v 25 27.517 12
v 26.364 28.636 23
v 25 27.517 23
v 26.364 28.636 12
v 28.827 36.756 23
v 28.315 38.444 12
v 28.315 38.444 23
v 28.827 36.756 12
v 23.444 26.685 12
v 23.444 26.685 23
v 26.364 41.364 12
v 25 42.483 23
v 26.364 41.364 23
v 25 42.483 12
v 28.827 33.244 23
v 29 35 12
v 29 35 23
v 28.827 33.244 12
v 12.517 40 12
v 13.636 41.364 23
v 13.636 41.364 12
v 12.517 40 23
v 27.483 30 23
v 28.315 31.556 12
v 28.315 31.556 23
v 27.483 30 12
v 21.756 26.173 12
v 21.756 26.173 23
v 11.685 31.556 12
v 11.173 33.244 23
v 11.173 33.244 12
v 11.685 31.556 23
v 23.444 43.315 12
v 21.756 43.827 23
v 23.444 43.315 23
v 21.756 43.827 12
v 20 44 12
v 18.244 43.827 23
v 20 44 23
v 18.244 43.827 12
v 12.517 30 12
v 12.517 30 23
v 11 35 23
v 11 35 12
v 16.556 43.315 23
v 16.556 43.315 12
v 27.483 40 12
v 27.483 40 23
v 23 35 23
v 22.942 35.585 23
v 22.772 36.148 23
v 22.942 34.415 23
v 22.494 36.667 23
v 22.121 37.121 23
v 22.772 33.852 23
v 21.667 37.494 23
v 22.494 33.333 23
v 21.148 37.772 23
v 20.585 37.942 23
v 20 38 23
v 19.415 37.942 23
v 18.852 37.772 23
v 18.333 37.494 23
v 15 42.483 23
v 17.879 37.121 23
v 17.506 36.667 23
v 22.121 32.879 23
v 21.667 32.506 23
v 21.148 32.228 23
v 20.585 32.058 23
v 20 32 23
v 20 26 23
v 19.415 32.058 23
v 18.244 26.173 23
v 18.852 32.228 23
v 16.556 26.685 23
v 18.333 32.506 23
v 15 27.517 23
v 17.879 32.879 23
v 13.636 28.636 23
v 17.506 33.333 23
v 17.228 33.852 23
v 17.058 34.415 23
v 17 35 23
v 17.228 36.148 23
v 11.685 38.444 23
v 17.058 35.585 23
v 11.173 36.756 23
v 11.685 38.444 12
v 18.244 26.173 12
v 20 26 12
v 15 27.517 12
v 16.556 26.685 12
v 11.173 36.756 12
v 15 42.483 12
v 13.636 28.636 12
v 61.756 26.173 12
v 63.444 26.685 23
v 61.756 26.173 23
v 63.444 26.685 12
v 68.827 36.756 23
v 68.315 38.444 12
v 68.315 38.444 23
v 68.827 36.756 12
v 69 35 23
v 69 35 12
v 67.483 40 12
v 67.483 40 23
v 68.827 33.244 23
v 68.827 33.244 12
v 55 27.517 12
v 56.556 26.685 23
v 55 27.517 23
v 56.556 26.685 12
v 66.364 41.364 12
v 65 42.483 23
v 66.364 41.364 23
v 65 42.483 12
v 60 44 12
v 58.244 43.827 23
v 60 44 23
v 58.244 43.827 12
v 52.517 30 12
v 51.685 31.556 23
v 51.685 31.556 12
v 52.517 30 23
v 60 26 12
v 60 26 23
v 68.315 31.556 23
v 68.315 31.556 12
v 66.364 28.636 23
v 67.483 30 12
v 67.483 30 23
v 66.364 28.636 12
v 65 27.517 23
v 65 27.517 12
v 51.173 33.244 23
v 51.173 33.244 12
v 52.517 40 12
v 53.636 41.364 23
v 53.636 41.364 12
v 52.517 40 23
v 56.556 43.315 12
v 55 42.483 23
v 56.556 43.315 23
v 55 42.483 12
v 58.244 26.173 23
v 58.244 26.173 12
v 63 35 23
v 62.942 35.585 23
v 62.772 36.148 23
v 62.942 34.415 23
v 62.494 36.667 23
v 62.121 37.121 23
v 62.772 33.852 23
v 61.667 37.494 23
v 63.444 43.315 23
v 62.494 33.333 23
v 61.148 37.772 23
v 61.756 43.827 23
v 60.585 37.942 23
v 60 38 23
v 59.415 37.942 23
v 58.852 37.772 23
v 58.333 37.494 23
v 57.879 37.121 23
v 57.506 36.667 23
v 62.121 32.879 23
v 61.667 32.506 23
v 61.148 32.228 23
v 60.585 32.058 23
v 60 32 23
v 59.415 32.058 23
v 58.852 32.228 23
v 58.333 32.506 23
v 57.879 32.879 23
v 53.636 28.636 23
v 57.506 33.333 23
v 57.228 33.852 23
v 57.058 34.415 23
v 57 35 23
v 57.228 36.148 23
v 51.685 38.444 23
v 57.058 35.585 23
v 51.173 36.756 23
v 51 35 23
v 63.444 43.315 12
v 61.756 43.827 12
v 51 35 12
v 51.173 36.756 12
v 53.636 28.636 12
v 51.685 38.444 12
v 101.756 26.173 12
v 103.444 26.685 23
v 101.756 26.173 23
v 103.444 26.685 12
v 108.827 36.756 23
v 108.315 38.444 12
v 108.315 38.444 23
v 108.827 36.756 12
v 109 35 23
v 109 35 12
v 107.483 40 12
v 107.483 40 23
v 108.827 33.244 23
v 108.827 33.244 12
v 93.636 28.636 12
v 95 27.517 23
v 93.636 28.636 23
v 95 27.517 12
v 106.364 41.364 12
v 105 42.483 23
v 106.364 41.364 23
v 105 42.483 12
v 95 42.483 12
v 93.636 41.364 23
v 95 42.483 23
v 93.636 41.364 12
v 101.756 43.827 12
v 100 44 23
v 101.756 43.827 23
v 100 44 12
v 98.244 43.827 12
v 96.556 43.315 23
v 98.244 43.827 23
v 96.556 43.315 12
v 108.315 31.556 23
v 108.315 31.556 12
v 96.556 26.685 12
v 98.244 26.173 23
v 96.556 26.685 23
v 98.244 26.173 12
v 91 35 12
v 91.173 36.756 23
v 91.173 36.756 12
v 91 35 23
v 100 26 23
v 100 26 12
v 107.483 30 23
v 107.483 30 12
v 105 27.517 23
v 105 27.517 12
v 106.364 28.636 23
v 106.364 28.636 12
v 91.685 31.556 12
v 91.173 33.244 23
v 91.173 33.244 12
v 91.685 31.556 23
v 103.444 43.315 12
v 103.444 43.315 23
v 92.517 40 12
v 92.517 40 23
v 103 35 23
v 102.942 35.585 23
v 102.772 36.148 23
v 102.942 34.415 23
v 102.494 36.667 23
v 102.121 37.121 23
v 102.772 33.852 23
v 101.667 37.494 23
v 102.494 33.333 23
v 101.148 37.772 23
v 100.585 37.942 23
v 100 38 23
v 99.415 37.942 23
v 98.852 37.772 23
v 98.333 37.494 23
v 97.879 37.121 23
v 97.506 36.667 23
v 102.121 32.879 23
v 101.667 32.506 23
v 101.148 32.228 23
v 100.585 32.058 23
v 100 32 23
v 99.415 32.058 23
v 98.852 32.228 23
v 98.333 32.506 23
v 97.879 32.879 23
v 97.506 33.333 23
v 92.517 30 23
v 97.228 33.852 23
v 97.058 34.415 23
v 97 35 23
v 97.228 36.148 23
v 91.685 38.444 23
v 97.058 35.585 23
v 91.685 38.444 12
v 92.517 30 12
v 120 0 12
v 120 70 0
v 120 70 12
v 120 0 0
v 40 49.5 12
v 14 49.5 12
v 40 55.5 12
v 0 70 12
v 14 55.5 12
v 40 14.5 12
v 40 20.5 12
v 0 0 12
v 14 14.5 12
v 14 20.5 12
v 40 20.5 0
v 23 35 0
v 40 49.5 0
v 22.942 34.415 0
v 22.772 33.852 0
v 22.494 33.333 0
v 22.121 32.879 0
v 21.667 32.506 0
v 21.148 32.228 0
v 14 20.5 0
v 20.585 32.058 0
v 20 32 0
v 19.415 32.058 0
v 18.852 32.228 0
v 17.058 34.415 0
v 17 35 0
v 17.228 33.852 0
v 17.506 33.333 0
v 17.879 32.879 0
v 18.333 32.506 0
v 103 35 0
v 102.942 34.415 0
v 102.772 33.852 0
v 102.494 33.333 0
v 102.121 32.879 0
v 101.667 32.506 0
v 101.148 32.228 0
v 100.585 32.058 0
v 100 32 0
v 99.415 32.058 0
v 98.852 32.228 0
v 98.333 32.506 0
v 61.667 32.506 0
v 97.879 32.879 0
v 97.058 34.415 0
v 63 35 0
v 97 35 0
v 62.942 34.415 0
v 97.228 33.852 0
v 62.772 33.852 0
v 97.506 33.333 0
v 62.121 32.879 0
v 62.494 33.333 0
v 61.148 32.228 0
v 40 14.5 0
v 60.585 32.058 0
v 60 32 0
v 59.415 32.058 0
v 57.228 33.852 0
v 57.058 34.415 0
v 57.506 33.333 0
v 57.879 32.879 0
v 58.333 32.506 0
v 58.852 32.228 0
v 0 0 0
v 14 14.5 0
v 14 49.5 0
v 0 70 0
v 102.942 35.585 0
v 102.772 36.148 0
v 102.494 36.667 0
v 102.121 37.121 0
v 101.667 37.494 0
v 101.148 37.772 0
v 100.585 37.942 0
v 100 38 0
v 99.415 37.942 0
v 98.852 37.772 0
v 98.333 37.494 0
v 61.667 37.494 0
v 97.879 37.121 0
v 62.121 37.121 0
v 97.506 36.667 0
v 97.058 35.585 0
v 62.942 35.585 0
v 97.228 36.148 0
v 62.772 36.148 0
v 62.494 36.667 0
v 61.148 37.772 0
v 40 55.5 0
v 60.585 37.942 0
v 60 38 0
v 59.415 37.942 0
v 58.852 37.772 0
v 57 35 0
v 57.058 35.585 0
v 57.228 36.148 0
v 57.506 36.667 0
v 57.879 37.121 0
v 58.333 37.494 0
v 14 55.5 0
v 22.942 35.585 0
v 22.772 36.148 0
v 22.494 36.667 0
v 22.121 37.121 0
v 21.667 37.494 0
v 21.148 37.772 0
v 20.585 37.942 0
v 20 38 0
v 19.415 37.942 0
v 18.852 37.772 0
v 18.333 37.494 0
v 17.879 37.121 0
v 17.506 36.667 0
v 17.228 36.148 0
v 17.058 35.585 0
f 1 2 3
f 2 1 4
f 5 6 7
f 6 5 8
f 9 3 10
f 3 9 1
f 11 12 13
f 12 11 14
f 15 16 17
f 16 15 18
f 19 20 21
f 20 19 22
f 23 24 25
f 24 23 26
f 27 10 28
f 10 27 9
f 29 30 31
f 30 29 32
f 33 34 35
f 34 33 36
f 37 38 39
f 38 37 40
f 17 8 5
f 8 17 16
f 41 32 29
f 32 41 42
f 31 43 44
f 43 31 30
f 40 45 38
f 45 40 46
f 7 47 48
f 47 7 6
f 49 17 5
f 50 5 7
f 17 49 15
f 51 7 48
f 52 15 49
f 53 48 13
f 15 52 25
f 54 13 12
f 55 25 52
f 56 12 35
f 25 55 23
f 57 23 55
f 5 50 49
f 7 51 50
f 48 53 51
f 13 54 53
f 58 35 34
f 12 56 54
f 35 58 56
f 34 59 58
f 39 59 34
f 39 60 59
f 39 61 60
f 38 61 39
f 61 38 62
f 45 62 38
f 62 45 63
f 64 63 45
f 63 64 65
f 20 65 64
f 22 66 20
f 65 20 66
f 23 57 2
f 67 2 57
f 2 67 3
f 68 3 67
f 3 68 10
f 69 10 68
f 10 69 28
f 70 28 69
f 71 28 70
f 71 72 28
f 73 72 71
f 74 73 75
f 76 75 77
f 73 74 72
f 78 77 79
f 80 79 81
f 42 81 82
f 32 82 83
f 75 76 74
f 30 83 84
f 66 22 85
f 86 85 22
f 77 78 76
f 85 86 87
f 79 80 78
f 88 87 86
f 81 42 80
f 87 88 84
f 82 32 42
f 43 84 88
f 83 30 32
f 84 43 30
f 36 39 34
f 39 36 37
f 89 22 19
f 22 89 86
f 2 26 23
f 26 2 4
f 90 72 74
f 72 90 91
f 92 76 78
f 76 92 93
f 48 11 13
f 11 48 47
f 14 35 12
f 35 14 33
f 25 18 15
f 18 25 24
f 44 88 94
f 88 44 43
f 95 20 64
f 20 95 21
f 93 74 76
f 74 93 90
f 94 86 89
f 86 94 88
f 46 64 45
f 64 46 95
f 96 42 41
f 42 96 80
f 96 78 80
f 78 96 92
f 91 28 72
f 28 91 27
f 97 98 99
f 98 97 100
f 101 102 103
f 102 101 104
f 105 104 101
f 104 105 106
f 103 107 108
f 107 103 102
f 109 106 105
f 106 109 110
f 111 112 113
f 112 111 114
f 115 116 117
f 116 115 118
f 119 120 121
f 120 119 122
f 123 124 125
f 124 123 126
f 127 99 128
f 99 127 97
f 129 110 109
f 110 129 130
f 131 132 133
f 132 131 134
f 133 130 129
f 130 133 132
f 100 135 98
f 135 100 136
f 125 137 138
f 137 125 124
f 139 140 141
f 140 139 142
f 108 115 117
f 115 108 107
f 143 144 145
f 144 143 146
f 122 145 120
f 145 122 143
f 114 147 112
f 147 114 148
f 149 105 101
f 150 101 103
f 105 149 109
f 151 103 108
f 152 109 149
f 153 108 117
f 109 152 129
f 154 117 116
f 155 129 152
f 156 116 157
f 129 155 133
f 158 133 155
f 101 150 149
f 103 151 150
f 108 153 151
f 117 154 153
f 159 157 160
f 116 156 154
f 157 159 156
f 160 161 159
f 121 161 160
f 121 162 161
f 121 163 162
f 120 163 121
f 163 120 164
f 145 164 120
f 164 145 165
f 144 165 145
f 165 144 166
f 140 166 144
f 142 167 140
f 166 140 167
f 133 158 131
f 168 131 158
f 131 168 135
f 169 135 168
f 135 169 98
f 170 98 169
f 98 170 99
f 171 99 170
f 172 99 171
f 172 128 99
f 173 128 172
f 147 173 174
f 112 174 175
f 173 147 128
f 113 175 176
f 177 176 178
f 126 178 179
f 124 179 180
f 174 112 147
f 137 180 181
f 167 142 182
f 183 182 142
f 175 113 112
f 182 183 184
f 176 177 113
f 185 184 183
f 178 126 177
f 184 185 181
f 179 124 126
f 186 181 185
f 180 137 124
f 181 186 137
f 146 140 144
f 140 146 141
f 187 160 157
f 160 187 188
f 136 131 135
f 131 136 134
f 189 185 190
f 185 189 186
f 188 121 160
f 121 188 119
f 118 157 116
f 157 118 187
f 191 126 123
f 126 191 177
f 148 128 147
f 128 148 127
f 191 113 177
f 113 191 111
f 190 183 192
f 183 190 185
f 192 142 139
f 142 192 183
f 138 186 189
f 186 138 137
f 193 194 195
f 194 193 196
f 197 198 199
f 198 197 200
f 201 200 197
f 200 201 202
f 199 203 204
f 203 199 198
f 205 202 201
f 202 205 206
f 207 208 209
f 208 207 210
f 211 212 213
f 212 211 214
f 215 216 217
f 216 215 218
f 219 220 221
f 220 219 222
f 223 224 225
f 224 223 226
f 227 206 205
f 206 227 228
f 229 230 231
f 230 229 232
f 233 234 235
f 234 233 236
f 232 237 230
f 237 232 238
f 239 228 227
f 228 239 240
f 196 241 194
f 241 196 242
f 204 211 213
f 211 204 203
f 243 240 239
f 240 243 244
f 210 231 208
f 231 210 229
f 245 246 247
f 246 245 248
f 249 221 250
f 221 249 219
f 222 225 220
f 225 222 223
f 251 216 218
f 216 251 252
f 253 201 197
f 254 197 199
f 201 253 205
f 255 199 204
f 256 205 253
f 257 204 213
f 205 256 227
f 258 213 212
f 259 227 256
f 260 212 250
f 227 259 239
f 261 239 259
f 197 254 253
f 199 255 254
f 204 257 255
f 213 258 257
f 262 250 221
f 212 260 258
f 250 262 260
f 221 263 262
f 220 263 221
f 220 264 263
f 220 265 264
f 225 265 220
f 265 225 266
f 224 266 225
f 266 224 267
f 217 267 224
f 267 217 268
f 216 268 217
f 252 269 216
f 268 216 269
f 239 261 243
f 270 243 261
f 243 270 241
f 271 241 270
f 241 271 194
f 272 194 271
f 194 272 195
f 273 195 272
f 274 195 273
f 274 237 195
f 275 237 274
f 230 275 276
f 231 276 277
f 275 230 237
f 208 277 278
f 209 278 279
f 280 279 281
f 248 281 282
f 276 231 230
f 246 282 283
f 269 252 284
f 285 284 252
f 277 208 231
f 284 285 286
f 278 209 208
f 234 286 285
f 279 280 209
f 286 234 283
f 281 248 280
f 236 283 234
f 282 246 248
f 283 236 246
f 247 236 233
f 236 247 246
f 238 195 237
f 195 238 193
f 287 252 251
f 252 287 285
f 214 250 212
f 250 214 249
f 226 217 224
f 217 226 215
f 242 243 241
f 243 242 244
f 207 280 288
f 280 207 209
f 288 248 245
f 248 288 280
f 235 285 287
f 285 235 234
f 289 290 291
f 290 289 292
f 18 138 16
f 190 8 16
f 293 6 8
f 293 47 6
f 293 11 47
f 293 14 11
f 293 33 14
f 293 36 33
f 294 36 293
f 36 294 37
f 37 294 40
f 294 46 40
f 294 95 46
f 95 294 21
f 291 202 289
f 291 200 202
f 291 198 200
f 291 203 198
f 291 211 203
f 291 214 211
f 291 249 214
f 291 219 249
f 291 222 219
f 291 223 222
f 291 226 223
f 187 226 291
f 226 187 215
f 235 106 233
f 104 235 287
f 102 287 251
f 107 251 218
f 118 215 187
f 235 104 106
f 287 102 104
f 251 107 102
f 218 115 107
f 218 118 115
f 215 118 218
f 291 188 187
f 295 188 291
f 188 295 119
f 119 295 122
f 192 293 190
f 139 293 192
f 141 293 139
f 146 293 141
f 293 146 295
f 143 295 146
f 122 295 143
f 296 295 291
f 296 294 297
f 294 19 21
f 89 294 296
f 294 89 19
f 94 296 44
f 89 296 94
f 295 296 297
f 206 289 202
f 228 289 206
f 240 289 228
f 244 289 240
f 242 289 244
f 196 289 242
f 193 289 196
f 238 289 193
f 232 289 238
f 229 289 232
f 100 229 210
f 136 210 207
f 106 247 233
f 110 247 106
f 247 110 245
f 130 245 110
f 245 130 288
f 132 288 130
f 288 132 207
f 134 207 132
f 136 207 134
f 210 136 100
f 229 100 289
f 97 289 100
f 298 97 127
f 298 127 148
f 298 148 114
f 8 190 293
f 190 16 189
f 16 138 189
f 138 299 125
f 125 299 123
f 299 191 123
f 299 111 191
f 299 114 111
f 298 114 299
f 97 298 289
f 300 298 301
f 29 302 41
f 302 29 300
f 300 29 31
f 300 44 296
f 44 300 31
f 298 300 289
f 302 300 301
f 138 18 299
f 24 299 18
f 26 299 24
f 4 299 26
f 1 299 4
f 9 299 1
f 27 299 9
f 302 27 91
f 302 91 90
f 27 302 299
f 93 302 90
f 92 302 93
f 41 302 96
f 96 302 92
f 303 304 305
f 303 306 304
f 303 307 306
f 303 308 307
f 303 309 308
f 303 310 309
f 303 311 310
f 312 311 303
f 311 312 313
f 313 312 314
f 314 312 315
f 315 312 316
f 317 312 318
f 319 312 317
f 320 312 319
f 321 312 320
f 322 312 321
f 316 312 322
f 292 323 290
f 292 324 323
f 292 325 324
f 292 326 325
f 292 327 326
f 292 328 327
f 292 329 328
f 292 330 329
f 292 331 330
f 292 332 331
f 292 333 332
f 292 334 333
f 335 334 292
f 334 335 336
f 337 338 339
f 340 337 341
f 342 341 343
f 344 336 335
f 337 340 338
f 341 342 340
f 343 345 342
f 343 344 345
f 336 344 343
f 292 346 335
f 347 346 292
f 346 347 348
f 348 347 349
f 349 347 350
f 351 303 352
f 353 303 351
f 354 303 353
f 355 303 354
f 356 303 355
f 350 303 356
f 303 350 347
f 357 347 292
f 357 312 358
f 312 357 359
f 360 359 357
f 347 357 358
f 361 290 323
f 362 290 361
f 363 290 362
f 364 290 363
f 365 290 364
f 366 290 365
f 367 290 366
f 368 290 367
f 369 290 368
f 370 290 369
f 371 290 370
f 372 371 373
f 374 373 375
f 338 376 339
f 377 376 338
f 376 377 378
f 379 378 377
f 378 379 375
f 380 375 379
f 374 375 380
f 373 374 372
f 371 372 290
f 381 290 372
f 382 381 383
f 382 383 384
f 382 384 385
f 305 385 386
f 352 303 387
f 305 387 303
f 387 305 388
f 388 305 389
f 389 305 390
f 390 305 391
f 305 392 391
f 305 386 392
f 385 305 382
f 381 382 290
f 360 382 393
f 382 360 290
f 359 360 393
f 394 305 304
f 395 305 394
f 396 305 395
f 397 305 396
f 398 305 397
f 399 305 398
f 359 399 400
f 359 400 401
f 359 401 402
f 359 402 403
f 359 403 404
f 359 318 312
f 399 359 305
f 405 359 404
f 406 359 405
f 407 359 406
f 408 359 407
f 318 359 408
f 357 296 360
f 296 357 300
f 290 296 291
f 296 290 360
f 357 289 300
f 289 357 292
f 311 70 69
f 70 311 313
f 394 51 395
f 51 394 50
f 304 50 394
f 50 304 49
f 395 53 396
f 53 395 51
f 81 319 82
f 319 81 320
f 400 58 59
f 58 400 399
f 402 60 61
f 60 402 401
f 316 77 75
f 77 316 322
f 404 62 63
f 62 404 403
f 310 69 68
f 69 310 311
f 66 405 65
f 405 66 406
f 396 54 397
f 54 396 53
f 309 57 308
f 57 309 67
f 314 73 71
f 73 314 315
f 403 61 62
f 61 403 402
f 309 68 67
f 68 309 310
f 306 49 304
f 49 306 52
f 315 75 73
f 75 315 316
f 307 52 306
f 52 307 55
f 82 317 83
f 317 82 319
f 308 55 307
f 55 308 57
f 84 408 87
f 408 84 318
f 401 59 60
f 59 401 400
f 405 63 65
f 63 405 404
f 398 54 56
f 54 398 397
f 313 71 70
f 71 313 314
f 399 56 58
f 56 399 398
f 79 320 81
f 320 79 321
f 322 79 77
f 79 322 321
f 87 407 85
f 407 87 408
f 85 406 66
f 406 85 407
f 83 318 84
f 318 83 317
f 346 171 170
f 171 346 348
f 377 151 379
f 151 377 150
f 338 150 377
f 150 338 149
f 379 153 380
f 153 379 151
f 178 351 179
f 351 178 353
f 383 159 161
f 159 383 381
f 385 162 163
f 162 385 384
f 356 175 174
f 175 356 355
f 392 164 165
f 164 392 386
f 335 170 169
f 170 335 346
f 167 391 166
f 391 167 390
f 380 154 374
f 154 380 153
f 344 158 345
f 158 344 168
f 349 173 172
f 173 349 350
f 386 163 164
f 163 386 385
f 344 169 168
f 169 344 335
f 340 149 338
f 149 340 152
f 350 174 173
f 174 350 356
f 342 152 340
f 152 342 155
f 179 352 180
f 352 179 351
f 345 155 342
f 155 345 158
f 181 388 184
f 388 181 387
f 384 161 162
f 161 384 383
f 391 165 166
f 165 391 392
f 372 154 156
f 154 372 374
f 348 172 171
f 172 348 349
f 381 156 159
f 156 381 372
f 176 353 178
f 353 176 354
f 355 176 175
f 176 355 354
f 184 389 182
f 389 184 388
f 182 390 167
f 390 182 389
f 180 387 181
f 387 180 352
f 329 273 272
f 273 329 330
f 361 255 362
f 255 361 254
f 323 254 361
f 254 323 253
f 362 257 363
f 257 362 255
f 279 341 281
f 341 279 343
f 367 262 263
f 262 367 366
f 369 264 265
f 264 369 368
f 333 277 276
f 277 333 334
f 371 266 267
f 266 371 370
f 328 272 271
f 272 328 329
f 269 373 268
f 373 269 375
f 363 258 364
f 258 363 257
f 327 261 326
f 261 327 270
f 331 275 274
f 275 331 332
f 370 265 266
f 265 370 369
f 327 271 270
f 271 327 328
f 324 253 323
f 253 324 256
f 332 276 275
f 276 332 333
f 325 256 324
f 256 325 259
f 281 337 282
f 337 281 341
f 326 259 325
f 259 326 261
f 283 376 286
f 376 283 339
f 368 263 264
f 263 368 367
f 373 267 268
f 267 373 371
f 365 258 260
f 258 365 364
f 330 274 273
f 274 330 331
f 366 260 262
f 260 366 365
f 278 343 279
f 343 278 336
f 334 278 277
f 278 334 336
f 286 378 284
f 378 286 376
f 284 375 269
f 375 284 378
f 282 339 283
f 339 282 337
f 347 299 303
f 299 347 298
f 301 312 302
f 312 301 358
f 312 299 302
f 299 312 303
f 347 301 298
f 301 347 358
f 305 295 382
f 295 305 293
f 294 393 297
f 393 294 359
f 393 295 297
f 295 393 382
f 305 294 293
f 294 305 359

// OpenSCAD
$fn = 32;

// ----------------------------------------------------------------------
// Drill jig: three_boss_slot jig
// ----------------------------------------------------------------------

// --- parameters (mm) ---
plate_l = 120;            // plate length, X
plate_w = 70;             // plate width, Y
plate_t = 12;             // plate thickness
boss_d = 18;              // guide boss diameter
boss_h = 12;              // boss height above the plate
guide_d = 6;              // guide hole diameter
boss_pitch = 40;          // boss pitch
slot_w = 6;               // clamp slot width
slot_l = 26;              // clamp slot length
slot_x = 14;              // slot start X
fit_tol = 0.05;           // tolerance for press fits, mm
free_tol = 0.2;           // tolerance for clearance fits, mm

n_boss = 3;  // guide bosses
boss_x0 = (plate_l - (n_boss - 1) * boss_pitch) / 2;  // first boss X
boss_top = plate_t - 1 + boss_h;  // boss crown height
total_h = boss_top;  // overall height

difference() {
  union() {
  cube([plate_l, plate_w, plate_t]);
  for (i = [0 : n_boss - 1])
    translate([boss_x0 + i * boss_pitch, plate_w / 2, plate_t - 1])
      cylinder(h = boss_h, d = boss_d);
  }
  for (i = [0 : n_boss - 1])
    translate([boss_x0 + i * boss_pitch, plate_w / 2, -1])
      cylinder(h = plate_t + boss_h, d = guide_d);
  for (cy = [plate_w * 0.25, plate_w * 0.75])
    translate([slot_x, cy - slot_w / 2, -1])
      cube([slot_l, slot_w, plate_t + 2]);
}
